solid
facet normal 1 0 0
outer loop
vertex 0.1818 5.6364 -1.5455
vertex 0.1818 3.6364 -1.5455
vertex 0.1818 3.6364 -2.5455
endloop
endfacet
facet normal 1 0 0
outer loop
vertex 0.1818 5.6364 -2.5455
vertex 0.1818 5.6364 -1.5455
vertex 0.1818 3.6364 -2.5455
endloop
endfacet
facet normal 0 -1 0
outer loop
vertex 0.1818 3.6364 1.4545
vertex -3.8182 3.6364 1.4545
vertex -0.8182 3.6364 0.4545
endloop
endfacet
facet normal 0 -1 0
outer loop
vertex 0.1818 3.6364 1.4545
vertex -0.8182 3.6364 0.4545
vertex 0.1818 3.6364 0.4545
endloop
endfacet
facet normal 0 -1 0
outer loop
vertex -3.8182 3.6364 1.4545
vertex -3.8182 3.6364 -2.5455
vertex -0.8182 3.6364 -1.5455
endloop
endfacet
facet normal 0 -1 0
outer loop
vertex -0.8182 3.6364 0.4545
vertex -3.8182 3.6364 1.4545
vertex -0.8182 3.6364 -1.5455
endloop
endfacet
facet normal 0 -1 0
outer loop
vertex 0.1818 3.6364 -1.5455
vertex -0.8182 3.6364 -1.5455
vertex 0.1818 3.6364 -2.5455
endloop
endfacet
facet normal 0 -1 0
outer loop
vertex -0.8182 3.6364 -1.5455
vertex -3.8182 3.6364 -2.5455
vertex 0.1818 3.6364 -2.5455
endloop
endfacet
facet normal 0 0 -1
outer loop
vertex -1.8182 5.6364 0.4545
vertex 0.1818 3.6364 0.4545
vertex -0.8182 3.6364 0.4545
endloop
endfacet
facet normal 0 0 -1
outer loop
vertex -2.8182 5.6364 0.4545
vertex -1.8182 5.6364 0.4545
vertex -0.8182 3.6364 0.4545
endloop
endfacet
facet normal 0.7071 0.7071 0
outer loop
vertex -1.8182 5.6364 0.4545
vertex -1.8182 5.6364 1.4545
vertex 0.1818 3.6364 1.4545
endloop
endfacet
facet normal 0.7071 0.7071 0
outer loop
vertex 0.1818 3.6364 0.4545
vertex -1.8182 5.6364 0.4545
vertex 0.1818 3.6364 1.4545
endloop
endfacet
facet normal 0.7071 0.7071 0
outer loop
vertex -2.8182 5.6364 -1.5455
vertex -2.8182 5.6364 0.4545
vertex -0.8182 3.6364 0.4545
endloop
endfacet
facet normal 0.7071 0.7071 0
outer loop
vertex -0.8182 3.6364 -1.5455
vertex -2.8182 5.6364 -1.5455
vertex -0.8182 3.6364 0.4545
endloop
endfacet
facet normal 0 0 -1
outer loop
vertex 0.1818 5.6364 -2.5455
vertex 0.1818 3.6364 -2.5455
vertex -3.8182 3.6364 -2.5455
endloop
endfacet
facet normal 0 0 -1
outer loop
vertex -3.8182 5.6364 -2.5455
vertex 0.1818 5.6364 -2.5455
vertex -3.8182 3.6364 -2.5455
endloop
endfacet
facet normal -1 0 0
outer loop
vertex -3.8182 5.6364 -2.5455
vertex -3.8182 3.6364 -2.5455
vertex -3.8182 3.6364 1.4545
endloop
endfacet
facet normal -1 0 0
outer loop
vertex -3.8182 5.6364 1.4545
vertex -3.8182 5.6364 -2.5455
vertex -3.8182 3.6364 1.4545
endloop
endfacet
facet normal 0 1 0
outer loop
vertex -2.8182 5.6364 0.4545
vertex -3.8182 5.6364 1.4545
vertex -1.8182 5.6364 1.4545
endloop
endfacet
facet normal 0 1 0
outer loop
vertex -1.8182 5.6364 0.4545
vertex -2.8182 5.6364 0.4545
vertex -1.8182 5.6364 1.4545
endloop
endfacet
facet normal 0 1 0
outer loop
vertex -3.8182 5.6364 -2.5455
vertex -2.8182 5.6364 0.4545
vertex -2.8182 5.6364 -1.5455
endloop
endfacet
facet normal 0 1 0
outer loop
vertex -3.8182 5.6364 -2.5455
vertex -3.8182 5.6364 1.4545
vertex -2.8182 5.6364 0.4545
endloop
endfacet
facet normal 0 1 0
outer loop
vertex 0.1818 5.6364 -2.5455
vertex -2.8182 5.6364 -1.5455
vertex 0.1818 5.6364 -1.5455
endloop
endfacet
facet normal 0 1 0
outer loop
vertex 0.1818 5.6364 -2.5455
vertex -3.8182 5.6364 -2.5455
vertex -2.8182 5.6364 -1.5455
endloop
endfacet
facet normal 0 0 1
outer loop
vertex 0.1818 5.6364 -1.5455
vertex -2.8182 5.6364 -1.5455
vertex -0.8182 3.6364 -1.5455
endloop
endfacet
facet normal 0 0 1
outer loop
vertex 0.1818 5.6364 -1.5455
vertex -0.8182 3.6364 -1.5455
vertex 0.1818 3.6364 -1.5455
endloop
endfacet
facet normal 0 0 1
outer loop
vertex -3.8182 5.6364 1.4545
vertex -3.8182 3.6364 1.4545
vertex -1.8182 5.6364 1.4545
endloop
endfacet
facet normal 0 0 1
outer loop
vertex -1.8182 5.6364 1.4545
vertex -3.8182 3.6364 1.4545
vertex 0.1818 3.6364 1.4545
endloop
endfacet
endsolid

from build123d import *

# Parameters (mm, degrees)
EXTRUDE_1_DEPTH     = 10
CUT_EXTRUDE_START   = -5
CUT_EXTRUDE_1_DEPTH = 10
CUT_EXTRUDE_2_DEPTH = 5
SCALE_1_SCALE       = 0.2


with BuildPart() as part:
    # 草圖1 → 填料-伸長1 (new body)
    with BuildSketch(Plane(origin=(0, 0, 0), x_dir=(1, 0, 0), z_dir=(0, 1, 0))):
        Polygon((10, 5), (10, 10), (-10, 10), (-10, -10), (10, -10), (10, -5), (5, -5), (5, 5), align=None)
    extrude(amount=EXTRUDE_1_DEPTH)

    # 草圖2 → 除料-伸長1 (cut)
    with BuildSketch(Plane.XY.offset(10).offset(CUT_EXTRUDE_START)):
        Polygon((10, 0), (10, 10), (-5, 10), (5, 0), align=None)
    extrude(amount=-CUT_EXTRUDE_1_DEPTH, mode=Mode.SUBTRACT)

    # 草圖3 → 除料-伸長2 (cut)
    with BuildSketch(Plane.XY.offset(10)):
        Polygon((0, 10), (10, 0), (10, 10), align=None)
    extrude(amount=-CUT_EXTRUDE_2_DEPTH, mode=Mode.SUBTRACT)


with BuildPart() as part_1:
    # 縮放比例1: scaled about (-2.272727273, 4.545454545, -0.681818182)
    add(part.part.scale(SCALE_1_SCALE).moved(Location((-1.818181818, 3.636363636, -0.545454546))))


solid = part_1.part
